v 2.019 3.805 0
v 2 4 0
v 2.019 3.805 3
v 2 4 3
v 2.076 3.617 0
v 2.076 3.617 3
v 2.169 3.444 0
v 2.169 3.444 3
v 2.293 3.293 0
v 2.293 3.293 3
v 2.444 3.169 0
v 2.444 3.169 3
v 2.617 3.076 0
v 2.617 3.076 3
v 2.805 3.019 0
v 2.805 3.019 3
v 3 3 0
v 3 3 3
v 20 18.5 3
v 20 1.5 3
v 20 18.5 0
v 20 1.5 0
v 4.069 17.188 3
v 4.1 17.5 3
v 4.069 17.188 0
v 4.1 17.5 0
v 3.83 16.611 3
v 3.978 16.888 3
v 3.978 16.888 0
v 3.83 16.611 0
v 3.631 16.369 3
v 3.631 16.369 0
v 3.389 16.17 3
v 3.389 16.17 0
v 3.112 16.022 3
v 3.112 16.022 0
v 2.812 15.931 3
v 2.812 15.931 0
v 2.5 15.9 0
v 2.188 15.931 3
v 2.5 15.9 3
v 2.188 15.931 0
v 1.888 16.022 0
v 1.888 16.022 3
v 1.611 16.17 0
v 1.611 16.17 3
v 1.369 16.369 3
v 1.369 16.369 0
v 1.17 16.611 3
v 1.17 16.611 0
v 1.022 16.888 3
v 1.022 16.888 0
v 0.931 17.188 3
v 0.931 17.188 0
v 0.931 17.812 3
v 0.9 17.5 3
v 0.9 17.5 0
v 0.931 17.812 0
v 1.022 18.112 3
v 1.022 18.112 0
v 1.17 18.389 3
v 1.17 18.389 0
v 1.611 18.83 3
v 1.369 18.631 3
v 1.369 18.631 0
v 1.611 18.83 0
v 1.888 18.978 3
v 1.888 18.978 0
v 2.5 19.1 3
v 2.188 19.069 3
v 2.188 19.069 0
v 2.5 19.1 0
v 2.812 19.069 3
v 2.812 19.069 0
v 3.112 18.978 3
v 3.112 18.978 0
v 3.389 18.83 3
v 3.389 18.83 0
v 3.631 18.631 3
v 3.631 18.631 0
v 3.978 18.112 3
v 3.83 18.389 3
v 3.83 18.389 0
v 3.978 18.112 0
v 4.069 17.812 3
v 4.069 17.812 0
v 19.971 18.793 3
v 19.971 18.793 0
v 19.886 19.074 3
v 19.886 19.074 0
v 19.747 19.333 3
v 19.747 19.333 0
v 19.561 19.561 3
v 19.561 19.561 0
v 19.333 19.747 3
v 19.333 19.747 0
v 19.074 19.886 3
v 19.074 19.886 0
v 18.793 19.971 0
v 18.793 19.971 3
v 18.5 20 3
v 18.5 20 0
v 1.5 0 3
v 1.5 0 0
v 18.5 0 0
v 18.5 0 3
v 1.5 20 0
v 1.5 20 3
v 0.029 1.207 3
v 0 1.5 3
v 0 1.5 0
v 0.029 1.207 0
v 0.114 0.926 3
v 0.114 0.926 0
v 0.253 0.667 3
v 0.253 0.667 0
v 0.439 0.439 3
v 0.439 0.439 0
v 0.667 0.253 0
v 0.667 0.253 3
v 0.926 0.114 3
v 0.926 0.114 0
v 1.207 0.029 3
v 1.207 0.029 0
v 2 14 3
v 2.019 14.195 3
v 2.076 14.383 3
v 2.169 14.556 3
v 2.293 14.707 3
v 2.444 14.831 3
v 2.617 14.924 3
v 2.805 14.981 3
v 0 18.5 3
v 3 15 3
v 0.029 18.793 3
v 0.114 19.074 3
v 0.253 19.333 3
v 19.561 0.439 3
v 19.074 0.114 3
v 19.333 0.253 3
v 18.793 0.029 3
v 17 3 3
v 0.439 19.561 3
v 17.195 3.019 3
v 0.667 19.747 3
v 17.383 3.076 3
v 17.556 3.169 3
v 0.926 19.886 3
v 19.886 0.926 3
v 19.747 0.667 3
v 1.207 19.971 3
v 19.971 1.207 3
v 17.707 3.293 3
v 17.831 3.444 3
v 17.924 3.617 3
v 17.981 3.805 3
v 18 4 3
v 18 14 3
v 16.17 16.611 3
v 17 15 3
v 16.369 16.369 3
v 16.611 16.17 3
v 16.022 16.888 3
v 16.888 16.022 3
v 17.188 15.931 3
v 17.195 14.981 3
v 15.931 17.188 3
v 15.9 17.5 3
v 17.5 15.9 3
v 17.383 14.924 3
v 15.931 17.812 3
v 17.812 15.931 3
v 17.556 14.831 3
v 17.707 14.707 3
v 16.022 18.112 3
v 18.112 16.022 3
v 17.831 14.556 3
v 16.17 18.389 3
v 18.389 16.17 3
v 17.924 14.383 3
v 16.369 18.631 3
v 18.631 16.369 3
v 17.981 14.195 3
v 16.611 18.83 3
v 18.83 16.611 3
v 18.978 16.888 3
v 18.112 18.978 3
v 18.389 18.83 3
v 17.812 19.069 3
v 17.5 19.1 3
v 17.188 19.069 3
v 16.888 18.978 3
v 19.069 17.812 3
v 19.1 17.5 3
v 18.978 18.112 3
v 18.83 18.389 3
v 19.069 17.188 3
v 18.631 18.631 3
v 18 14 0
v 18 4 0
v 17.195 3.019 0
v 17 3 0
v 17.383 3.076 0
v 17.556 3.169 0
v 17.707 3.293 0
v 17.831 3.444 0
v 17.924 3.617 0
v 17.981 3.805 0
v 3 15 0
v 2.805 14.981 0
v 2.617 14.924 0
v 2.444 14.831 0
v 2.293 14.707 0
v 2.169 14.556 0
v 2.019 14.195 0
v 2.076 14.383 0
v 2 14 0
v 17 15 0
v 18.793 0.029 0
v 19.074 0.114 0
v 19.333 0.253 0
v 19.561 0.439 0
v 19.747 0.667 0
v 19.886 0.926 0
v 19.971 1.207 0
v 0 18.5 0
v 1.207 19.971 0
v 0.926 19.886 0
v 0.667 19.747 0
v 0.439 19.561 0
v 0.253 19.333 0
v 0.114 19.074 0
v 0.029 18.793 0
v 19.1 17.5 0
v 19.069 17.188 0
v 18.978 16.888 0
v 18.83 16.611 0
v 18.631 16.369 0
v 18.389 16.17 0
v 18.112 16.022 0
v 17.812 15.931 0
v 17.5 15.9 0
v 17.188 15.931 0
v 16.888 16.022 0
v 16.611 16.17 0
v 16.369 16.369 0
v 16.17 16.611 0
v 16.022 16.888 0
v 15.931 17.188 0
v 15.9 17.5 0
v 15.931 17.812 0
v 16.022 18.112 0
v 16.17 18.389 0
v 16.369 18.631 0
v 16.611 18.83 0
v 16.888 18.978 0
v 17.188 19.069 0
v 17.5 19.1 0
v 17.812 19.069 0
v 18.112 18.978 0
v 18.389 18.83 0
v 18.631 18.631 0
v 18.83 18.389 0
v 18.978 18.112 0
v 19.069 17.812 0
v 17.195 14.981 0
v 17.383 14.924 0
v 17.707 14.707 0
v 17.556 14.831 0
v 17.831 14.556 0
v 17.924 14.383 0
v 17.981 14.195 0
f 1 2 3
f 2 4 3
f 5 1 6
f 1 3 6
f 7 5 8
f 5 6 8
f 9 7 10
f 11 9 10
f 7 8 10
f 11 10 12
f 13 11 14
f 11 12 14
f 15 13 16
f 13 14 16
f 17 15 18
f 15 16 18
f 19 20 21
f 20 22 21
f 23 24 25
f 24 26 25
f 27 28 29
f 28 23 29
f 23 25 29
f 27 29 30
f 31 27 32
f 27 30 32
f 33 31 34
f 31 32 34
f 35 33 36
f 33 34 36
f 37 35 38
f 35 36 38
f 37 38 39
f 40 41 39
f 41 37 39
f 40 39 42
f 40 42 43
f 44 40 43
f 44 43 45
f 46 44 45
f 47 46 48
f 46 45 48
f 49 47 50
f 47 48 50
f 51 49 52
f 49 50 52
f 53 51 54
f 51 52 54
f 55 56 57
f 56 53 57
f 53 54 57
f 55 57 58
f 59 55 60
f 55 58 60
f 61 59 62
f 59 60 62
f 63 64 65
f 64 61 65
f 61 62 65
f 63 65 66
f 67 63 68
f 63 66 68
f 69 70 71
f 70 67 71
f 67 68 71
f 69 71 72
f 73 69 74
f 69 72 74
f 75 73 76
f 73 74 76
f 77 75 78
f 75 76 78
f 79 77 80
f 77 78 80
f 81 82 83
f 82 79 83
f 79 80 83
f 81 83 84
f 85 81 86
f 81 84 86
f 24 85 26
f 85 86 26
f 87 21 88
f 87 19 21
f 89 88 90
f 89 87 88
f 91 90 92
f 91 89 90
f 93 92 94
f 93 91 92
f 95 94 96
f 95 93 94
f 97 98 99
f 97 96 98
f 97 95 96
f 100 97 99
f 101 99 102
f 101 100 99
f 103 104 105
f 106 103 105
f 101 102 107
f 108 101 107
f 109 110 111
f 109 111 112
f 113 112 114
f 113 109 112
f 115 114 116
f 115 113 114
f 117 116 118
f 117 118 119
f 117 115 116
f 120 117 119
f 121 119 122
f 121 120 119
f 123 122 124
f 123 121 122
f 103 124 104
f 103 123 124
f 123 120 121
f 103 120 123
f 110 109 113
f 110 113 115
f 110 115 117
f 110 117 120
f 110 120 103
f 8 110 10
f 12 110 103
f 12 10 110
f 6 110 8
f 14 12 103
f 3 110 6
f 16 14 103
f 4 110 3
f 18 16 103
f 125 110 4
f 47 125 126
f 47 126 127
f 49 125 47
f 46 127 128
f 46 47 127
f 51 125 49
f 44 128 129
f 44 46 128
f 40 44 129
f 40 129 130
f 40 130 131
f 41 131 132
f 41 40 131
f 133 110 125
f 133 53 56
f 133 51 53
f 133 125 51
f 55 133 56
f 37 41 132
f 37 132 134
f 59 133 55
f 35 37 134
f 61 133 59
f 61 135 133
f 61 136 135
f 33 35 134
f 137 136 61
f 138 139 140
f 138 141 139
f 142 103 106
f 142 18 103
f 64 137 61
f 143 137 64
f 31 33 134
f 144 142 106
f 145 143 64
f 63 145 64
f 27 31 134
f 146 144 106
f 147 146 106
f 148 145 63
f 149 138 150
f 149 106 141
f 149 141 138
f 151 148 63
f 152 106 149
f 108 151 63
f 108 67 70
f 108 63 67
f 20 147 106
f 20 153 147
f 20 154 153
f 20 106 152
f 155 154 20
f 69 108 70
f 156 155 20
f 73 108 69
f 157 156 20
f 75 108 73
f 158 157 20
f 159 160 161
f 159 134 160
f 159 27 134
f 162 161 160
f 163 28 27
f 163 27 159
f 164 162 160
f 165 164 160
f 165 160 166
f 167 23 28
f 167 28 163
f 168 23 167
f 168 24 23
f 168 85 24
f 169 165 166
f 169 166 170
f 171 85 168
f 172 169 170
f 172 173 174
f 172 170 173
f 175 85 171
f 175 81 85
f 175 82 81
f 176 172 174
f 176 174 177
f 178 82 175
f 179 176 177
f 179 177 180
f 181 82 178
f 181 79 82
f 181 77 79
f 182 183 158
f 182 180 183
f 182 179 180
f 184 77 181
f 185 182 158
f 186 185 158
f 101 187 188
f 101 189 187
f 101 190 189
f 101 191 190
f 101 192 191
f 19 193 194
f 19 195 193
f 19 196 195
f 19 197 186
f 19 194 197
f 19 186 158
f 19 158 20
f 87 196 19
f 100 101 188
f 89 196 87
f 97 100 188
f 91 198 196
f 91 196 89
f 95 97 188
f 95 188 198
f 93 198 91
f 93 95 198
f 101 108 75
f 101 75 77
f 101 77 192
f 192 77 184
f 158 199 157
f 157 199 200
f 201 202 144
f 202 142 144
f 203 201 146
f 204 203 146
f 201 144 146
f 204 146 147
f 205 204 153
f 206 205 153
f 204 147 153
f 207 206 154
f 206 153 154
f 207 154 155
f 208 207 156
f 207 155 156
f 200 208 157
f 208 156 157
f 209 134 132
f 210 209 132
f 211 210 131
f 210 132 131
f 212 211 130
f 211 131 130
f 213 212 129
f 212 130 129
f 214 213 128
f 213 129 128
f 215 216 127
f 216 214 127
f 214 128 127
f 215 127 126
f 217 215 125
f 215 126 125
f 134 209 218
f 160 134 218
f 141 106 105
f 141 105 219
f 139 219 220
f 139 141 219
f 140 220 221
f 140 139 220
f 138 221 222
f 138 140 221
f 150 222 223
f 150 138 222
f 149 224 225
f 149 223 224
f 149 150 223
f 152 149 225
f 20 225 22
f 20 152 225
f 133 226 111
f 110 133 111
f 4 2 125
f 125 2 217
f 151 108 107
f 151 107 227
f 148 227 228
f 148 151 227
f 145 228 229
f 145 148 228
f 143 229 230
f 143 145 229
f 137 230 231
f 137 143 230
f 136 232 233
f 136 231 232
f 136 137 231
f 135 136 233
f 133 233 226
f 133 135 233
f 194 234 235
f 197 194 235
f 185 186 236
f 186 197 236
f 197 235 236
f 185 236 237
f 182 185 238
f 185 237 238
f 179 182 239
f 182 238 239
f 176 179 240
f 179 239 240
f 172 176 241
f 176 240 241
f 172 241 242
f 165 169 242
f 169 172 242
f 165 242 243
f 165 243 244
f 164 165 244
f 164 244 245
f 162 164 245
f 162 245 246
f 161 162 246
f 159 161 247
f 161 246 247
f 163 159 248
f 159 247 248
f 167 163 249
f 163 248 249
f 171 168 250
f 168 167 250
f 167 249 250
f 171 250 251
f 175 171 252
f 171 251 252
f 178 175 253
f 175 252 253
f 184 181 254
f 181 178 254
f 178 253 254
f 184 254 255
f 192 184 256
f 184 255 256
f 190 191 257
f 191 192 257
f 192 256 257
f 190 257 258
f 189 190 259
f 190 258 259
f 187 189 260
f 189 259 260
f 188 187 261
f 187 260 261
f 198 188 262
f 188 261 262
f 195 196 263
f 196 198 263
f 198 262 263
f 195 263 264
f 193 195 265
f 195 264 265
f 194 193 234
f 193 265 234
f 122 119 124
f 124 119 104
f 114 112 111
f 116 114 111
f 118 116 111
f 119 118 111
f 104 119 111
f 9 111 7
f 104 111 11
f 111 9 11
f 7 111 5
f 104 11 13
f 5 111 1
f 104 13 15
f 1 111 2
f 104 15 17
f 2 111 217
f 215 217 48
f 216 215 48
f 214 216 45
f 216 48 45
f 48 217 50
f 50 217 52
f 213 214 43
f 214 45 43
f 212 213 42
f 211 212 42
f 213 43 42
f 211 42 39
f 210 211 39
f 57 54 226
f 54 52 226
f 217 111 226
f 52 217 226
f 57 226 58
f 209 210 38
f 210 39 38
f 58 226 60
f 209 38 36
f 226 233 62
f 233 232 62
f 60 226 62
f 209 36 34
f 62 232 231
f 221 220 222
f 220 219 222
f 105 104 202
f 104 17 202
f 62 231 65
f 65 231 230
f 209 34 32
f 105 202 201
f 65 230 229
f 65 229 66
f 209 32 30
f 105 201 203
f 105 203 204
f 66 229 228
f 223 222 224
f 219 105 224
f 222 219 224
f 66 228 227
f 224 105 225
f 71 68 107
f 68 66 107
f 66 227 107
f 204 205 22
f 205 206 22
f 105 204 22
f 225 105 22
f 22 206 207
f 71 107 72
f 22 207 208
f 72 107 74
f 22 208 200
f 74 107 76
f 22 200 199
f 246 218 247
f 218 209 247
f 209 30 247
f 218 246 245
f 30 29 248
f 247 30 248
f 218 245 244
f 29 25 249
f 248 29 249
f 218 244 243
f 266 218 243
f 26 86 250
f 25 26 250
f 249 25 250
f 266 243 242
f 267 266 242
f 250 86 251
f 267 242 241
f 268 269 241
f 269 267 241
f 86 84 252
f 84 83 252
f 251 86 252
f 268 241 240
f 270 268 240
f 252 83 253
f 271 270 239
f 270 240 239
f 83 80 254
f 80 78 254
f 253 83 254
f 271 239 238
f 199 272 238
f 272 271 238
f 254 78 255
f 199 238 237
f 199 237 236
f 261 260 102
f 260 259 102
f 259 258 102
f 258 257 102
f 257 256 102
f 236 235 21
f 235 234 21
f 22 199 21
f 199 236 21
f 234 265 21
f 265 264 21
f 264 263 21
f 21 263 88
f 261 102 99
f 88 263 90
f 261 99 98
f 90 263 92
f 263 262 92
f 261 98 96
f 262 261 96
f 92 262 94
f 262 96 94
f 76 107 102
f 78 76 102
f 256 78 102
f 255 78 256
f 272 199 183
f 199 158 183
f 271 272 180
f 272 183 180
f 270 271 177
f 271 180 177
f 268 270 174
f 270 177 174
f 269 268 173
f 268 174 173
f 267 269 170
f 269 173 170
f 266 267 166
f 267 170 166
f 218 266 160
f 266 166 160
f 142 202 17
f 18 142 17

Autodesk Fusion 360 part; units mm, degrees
sketch "Sketch1" plane through (0, 0, 0) normal (0, 0, 1) x (1, 0, 0) in component "ZSY Standoff"
  line L0 (0, 0) -> (20, 0)
  line L1 (20, 0) -> (20, 20)
  line L2 (20, 20) -> (0, 20)
  line L3 (0, 20) -> (0, 0)
  line L4 (0, 17.5) -> (20, 17.5) construction
  line L5 (10, 20) -> (10, 0) construction
  circle A0 centre (17.5, 17.5) radius 1.6
  circle A1 centre (2.5, 17.5) radius 1.6
  line L6 (2, 20) -> (2, 0) construction
  line L7 (18, 20) -> (18, 0) construction
  line L8 (0, 3) -> (20, 3) construction
  line L9 (0, 15) -> (20, 15) construction
  line L10 (2, 15) -> (18, 15)
  line L11 (18, 15) -> (18, 3)
  line L12 (18, 3) -> (2, 3)
  line L13 (2, 3) -> (2, 15)
  dimension "d1" = 20
  dimension "d2" = 20
  dimension "d3" = 2.5
  dimension "d4" = 3.2
  dimension "d5" = 3.2
  dimension "d6" = 7.5
  dimension "d7" = 7.5
  dimension "d8" = 2
  dimension "d9" = 2
  dimension "d10" = 3
  dimension "d11" = 5
extrude "Extrude1" add sketch "Sketch1" along normal blind 3 in component "ZSY Standoff"
fillet "Fillet1" radius 1.5 4 edges at (20, 20, 1.5) (0, 20, 1.5) (0, 0, 1.5) (20, 0, 1.5) in component "ZSY Standoff"
fillet "Fillet2" radius 1 4 edges at (2, 15, 1.5) (18, 15, 1.5) (18, 3, 1.5) (2, 3, 1.5) in component "ZSY Standoff"
component "ZSY Standoff" placed x (1, 0, 0) y (0, 1, 0) z (0, 0, 1) at (0, 0, 0)
